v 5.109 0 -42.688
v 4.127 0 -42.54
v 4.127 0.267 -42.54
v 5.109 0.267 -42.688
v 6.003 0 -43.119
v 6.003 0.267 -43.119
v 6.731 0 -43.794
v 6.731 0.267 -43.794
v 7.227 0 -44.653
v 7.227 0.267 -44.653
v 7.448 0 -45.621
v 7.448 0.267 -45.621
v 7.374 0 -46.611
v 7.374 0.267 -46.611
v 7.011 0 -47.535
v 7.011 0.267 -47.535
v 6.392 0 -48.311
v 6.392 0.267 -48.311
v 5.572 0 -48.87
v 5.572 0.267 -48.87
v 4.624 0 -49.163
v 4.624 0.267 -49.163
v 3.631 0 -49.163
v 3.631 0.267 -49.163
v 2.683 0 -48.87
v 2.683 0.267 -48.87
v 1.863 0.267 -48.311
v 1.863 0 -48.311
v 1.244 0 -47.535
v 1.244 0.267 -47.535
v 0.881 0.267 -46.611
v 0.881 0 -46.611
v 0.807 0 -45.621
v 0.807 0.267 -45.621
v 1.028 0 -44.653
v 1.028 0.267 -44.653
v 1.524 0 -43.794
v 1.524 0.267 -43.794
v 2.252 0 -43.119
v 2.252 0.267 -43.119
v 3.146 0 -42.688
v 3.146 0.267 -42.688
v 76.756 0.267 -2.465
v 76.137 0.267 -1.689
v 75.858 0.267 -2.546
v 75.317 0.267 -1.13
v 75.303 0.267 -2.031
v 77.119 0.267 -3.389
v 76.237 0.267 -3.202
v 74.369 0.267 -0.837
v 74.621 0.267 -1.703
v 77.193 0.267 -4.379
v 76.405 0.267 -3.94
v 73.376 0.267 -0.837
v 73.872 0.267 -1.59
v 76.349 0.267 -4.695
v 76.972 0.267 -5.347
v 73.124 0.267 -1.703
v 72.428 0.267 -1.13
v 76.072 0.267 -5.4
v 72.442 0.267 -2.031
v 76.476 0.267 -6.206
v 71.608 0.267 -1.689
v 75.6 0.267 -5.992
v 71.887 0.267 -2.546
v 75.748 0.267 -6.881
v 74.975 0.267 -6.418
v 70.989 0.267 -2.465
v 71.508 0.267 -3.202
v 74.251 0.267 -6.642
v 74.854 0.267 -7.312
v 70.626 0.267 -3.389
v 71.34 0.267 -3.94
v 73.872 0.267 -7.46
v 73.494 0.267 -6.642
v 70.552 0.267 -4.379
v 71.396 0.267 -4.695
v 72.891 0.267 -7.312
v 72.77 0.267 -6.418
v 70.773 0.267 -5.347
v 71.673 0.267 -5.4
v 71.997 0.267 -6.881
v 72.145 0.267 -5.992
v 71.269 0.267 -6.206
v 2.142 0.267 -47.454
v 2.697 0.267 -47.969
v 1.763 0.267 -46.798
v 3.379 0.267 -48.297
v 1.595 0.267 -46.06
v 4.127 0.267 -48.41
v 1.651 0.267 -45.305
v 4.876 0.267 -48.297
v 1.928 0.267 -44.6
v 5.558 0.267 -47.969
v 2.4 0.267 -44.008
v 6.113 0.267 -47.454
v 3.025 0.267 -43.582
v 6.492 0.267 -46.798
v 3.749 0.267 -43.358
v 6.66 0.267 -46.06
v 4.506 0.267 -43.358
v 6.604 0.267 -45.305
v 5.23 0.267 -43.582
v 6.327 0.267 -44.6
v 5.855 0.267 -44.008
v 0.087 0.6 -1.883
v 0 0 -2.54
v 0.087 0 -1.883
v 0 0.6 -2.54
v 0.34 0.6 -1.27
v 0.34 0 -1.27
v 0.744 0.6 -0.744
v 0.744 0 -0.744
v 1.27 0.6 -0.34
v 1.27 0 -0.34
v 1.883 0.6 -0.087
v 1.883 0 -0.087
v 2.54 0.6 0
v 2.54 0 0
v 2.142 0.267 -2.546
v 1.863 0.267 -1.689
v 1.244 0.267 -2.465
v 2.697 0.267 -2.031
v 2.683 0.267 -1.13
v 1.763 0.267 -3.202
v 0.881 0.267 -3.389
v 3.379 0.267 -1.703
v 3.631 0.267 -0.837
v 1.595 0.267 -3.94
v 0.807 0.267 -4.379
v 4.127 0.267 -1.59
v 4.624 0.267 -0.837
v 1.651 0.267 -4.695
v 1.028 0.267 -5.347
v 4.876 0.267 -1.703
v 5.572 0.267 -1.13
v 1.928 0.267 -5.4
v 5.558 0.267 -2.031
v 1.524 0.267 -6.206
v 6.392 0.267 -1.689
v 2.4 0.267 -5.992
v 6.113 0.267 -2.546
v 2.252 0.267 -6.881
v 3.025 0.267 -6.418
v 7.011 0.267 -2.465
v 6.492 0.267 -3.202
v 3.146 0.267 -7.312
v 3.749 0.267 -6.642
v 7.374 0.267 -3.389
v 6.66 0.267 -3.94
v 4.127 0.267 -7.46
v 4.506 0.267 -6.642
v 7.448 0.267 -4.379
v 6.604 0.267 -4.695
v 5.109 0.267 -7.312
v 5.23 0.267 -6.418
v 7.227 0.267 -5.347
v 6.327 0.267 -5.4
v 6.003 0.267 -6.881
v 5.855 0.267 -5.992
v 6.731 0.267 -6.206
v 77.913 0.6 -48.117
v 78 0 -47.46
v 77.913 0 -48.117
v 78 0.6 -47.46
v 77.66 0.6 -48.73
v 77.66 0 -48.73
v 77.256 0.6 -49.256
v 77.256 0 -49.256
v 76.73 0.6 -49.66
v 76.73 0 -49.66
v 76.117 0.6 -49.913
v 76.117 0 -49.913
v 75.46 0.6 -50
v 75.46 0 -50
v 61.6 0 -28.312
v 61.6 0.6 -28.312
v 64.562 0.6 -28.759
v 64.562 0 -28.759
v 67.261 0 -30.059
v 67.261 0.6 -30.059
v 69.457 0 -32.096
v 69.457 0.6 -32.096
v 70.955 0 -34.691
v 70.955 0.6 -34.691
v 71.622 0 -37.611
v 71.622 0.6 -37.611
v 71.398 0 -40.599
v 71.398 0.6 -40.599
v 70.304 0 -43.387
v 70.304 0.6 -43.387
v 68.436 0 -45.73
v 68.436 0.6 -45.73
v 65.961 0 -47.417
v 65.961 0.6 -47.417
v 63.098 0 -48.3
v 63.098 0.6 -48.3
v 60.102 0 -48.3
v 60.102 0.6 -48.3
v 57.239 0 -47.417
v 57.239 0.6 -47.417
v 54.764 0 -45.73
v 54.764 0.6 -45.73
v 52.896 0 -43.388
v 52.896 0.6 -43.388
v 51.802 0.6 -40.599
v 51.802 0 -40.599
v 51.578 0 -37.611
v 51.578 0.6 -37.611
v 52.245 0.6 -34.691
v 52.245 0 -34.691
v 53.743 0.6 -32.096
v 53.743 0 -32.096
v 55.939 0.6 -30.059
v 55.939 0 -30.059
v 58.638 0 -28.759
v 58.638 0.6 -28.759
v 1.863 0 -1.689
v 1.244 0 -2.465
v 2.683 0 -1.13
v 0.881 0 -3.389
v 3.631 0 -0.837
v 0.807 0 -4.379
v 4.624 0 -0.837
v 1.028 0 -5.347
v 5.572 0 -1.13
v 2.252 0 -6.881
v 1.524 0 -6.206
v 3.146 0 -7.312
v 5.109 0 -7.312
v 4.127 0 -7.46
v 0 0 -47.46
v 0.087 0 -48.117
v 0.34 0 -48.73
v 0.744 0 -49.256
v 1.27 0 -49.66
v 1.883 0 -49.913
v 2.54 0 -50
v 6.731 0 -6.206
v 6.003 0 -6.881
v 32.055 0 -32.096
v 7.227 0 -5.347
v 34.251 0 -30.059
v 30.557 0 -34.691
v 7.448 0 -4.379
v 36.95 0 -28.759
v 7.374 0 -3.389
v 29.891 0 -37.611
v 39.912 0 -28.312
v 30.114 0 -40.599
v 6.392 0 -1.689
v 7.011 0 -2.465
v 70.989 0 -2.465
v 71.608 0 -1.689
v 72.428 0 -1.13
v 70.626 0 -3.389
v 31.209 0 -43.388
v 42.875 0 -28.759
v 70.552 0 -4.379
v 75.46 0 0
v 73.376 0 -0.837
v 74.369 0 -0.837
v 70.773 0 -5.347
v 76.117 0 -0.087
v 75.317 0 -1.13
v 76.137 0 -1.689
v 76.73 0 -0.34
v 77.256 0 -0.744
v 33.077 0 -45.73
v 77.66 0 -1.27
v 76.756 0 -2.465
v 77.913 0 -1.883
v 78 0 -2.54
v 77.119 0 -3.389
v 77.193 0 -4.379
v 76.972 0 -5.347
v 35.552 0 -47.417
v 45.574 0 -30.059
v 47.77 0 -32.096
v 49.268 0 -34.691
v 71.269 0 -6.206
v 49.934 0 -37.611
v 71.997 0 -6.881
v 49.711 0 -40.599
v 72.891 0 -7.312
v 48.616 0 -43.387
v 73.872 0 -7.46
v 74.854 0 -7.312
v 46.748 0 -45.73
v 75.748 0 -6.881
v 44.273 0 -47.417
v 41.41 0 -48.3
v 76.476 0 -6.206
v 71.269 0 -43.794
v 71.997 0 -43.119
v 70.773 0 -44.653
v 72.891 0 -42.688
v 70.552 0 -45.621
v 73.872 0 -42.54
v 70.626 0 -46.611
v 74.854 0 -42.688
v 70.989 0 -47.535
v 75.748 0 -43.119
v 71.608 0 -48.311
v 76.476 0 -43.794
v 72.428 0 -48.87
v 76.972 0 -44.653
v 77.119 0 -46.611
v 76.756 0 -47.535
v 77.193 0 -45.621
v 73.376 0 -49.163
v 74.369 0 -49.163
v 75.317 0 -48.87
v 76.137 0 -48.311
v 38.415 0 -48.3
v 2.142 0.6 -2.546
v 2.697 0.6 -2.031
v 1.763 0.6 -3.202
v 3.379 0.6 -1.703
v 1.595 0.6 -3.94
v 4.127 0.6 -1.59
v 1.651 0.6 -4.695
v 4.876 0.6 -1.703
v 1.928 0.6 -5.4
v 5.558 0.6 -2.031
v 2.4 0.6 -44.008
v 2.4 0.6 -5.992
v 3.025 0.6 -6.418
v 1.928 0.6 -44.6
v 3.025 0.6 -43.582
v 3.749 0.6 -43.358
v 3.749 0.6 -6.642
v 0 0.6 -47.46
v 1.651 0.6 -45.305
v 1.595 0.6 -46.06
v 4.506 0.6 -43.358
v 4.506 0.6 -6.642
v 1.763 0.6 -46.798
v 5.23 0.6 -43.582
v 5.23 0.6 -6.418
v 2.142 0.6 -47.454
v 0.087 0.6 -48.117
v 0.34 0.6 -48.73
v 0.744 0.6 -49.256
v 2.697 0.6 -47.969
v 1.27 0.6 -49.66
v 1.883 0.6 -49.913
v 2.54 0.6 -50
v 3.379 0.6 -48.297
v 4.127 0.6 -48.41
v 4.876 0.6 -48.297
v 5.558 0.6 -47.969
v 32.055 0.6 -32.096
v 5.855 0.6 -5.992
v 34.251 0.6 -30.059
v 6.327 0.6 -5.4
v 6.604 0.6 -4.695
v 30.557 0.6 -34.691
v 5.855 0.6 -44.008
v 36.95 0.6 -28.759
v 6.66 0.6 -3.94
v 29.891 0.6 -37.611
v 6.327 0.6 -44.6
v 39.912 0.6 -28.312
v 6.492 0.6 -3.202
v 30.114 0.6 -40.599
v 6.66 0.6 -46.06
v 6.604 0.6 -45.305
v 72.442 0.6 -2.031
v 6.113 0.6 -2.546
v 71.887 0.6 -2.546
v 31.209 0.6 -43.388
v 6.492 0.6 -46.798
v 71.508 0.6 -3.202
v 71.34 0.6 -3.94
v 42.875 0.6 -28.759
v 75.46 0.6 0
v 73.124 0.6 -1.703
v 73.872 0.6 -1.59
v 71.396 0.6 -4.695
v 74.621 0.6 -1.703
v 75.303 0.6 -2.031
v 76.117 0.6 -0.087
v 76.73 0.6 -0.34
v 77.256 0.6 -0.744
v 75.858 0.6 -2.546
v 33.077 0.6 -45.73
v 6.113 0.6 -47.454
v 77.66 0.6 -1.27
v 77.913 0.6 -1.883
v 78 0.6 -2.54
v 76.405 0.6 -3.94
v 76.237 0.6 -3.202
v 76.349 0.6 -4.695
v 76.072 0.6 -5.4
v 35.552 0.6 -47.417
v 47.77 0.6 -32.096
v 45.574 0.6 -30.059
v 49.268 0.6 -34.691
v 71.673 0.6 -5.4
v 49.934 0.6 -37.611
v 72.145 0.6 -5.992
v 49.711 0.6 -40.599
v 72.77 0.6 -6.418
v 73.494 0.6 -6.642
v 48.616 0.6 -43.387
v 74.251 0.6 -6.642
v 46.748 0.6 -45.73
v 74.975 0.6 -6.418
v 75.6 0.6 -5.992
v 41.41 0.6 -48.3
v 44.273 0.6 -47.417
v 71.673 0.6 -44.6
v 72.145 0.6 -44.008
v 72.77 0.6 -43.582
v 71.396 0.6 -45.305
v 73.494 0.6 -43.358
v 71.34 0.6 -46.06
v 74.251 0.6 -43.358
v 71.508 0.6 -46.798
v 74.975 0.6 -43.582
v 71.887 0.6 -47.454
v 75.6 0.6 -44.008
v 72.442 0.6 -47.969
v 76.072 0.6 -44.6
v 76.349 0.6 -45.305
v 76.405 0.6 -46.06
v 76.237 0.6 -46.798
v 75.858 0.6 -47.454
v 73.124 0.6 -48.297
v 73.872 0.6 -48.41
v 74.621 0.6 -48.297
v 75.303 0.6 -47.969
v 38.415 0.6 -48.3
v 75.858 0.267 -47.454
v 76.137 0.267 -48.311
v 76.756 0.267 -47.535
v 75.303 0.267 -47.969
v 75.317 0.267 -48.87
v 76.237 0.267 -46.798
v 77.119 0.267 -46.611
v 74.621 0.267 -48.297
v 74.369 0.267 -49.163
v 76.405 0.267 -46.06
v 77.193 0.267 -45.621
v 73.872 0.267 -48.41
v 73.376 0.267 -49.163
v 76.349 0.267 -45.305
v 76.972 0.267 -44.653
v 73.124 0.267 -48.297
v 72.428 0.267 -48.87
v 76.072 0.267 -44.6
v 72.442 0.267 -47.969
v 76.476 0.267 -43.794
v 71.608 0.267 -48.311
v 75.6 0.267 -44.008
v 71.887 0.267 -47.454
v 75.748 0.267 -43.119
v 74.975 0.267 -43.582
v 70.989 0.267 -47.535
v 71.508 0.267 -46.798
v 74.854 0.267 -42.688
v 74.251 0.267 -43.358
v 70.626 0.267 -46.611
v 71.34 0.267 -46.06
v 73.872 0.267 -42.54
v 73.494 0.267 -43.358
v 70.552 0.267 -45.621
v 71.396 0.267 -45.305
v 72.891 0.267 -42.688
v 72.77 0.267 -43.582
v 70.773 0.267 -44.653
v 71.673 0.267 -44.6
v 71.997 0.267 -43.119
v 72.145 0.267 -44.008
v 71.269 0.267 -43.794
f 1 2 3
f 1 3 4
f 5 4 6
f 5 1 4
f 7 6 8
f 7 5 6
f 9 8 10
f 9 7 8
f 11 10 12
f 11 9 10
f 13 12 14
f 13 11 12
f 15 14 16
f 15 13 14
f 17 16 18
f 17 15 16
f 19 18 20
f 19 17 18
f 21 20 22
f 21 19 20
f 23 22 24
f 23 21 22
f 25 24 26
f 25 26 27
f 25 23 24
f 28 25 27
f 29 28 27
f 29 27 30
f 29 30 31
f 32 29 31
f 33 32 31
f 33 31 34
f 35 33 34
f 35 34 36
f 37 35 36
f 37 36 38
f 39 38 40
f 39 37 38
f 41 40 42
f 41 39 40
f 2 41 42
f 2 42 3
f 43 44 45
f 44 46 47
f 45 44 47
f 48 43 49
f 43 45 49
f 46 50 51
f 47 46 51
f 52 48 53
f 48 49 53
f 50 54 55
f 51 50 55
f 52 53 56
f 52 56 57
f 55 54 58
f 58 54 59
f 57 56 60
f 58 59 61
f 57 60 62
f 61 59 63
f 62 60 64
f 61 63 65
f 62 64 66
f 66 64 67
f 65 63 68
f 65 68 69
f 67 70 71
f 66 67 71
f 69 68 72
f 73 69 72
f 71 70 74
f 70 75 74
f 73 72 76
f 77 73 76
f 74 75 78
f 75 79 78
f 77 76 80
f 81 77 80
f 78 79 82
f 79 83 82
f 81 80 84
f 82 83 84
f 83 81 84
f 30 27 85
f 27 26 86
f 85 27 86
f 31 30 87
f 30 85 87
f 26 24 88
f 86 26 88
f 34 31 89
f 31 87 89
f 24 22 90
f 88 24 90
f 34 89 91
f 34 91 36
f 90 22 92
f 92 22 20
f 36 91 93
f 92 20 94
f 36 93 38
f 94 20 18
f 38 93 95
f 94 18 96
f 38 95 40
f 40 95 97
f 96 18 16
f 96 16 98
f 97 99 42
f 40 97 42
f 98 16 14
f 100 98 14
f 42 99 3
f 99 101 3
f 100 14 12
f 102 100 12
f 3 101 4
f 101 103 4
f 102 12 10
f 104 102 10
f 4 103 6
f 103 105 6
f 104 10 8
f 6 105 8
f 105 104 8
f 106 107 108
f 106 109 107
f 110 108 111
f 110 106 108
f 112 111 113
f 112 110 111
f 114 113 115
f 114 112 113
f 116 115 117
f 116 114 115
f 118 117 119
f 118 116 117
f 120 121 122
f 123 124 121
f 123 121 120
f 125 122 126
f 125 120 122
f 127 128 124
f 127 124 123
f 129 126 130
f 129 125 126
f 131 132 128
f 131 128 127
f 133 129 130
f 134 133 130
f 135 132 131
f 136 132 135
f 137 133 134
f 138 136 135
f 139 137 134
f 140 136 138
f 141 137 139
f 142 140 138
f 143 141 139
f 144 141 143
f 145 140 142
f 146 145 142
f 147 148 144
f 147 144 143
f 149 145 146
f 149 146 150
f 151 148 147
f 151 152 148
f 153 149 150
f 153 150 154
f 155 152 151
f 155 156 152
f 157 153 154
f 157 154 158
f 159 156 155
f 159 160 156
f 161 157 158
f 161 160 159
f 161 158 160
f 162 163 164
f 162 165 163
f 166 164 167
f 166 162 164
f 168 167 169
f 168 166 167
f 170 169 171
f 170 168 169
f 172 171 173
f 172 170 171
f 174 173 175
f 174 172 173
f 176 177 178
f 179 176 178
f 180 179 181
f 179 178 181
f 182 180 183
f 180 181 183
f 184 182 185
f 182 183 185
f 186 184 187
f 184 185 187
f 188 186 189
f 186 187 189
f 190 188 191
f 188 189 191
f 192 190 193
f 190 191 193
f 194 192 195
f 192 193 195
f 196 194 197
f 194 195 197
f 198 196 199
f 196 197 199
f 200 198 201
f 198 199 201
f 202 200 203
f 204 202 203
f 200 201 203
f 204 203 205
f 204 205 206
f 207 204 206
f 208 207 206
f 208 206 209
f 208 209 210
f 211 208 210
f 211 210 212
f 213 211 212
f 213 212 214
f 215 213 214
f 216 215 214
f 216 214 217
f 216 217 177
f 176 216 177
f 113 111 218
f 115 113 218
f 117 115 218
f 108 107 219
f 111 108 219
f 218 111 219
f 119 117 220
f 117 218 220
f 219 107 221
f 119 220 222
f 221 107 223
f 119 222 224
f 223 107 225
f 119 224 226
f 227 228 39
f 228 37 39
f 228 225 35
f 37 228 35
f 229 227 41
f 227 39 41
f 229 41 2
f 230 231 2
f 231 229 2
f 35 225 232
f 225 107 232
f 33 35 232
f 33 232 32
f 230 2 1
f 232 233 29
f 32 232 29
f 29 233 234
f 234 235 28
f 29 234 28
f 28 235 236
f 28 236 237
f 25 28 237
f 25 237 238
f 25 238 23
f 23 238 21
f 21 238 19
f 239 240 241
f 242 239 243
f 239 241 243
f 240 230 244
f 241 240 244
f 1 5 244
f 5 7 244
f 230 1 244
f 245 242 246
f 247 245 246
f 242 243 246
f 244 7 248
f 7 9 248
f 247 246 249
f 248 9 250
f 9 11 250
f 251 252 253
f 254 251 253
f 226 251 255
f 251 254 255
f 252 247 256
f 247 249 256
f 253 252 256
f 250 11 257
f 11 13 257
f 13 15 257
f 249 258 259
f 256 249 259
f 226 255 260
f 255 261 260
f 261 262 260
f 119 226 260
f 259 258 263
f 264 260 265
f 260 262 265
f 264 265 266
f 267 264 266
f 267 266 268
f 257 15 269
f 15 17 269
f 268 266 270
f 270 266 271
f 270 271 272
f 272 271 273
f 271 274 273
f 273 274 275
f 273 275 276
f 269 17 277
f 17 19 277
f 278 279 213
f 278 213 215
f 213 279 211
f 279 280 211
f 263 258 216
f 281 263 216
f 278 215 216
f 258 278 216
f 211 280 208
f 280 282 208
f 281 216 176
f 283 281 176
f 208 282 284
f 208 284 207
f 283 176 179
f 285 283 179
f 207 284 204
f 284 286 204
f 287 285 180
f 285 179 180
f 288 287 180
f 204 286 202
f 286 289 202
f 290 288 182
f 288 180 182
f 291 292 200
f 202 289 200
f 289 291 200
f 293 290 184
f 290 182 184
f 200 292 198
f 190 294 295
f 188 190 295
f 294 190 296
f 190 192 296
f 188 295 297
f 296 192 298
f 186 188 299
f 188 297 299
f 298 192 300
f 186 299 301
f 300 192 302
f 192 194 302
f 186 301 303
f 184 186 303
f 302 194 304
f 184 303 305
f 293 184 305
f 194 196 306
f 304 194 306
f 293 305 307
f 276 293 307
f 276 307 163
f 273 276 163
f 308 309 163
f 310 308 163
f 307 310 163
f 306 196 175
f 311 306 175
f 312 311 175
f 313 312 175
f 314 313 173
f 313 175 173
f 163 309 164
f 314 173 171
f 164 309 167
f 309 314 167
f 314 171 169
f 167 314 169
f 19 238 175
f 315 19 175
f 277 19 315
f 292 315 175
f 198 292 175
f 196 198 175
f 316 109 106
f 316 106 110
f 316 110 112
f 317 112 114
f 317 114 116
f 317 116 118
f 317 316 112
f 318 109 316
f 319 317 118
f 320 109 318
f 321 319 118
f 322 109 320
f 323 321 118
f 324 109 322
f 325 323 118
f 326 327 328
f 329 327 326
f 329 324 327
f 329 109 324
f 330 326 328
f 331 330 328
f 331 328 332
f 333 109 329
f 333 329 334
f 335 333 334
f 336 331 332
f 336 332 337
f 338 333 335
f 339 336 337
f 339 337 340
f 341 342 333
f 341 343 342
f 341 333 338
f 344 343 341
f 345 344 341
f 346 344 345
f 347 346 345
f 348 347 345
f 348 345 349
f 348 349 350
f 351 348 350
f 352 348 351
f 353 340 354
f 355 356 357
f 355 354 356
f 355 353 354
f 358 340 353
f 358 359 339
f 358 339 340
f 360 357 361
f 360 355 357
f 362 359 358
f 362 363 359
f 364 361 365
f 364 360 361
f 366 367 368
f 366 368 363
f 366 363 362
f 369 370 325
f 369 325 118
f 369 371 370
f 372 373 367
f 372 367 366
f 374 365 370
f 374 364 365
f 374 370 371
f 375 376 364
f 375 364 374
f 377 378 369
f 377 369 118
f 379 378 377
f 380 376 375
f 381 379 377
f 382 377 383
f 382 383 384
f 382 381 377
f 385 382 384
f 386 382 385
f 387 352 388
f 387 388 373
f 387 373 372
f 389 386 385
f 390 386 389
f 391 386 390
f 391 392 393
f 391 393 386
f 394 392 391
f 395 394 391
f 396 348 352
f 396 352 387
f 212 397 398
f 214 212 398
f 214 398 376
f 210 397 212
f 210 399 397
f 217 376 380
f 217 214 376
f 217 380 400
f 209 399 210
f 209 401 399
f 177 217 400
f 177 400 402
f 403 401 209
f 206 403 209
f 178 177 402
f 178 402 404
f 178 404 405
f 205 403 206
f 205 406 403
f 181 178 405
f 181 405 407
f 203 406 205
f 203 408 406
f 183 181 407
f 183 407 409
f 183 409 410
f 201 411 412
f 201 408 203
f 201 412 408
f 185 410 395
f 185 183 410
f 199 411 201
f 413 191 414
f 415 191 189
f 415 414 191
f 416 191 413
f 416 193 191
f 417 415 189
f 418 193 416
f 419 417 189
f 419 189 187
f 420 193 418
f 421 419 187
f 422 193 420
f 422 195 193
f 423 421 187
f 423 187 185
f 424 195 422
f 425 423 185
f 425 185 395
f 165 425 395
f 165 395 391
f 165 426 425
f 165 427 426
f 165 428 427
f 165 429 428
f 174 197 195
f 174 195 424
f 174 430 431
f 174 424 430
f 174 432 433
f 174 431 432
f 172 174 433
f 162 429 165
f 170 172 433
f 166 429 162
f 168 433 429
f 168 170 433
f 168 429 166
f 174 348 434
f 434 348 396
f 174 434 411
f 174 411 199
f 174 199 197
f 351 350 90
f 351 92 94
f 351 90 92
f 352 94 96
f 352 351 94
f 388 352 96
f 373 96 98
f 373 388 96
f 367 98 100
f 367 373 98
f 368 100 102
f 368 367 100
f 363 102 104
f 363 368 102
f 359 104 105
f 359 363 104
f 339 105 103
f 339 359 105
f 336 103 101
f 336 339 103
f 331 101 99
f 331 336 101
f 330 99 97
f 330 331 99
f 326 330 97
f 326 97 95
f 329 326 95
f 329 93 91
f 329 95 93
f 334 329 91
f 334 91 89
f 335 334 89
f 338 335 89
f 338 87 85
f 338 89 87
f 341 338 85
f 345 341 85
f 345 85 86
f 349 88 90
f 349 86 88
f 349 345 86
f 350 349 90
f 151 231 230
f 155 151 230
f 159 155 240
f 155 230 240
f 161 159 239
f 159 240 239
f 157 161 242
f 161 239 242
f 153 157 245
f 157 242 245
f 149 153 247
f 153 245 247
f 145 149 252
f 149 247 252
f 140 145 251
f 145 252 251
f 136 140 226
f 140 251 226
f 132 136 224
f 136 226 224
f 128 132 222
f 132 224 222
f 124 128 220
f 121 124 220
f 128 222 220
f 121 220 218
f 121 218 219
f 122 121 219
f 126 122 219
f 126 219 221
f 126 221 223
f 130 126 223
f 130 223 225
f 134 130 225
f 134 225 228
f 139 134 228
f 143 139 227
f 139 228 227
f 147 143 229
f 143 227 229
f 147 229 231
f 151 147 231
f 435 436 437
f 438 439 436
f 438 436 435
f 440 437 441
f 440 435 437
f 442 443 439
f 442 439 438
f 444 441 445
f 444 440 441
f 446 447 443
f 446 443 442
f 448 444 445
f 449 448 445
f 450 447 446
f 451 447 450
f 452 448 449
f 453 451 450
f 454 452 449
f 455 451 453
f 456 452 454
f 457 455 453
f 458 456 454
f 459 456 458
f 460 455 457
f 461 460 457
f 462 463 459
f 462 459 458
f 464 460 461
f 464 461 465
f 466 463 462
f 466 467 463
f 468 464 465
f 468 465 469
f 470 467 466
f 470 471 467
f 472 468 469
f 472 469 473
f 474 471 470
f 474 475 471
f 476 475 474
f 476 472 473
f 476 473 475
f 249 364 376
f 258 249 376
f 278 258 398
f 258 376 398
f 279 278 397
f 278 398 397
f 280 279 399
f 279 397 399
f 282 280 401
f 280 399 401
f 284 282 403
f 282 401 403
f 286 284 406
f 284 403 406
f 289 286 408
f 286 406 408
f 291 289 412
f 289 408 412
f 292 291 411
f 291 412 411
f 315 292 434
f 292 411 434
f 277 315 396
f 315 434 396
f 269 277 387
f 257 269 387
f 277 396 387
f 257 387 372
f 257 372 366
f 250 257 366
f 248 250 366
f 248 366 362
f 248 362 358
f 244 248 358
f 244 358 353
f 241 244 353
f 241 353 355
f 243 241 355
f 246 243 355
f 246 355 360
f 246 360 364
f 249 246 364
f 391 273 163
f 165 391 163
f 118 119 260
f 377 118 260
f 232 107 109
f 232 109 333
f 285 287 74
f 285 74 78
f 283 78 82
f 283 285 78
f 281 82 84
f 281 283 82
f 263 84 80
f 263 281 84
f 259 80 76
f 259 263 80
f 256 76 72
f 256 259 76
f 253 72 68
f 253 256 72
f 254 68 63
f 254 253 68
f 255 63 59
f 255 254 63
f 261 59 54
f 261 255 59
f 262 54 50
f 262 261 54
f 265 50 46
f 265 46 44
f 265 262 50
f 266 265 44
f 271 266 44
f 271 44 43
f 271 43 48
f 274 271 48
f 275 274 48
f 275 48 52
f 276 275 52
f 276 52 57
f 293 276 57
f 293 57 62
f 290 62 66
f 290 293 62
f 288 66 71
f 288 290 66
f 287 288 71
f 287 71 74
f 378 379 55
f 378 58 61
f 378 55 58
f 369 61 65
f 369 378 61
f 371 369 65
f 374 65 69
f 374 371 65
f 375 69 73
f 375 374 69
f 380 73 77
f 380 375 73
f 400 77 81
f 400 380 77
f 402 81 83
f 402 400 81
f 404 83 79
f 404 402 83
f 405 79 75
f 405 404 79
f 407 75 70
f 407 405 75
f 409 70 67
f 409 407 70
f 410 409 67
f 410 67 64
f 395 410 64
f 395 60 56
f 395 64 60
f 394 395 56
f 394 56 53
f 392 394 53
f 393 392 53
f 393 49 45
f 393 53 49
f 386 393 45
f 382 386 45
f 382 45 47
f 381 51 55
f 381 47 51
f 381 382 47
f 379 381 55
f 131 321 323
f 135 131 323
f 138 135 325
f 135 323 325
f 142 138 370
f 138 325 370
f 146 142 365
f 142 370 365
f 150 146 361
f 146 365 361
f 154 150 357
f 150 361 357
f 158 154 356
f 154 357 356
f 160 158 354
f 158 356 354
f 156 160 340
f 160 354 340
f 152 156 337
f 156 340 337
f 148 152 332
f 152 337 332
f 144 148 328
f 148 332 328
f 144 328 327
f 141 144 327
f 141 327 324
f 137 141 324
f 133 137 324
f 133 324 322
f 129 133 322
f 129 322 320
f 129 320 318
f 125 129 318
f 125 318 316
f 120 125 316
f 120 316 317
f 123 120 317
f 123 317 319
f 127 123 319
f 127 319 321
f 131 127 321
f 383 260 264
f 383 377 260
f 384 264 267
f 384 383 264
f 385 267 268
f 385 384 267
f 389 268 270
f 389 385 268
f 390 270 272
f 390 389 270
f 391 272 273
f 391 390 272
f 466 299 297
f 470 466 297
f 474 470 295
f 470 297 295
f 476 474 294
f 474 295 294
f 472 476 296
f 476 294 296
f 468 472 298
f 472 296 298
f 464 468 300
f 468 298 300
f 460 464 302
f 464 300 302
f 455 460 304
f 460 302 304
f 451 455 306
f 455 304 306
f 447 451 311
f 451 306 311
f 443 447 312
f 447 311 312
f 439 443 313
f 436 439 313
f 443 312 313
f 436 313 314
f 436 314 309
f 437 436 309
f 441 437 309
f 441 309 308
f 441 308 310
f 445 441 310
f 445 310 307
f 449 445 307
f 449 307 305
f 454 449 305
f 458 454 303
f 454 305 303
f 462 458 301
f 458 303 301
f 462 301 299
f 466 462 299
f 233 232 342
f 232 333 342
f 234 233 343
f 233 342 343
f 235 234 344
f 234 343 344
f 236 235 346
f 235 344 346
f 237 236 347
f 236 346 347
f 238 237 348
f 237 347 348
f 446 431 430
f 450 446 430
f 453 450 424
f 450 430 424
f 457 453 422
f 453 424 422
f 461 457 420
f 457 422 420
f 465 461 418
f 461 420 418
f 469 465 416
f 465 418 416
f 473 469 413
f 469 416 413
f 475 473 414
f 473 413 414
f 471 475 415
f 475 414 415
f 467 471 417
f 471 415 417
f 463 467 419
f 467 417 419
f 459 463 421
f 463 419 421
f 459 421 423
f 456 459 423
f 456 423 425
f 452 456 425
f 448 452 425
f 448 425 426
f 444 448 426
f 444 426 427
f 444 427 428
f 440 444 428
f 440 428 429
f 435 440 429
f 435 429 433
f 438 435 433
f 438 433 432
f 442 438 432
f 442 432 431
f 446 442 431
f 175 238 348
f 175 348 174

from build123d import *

# Parameters (mm, degrees)
SKETCH1_W               = 78
SKETCH1_H               = 50
PCB_DEPTH               = 0.6
CARD_EDGES_R            = 2.54
SKETCH4_R               = 2.54
MAGNET_HOLE_CUT_DEPTH   = 93.651821353
SKETCH8_R               = 3.33
STEEL_INLAY_CUT_DEPTH   = 0.266625
MIRROR2_COPY_1_SKETCH_R = 2.54
MIRROR2_COPY_1_DEPTH    = 93.651821353
MIRROR2_COPY_2_SKETCH_R = 3.33
MIRROR2_COPY_2_DEPTH    = 0.266625
SKETCH15_R              = 10.05
BATTERY_HOLES_DEPTH     = 93.651821353


with BuildPart() as part:
    # Sketch1 → pcb (new body)
    with BuildSketch(Plane(origin=(0, 0, 0), x_dir=(1, 0, 0), z_dir=(0, 1, 0))):
        with Locations((39, 25)):
            Rectangle(SKETCH1_W, SKETCH1_H)
    extrude(amount=PCB_DEPTH)

    # card edges
    card_edges_edges = [part.edges().sort_by_distance(p)[0] for p in [
        (0, 0.3, -50),
        (78, 0.3, -50),
        (78, 0.3, 0),
        (0, 0.3, 0),
    ]]
    fillet(card_edges_edges, radius=CARD_EDGES_R)

    # Sketch4 → magnet hole cut (cut, through all)
    with BuildSketch(Plane(origin=(0, 0.6, 0), x_dir=(1, 0, 0), z_dir=(0, 1, 0))):
        with Locations(Location((4.1275, 4.13, 0), (0, 0, 270))):
            Circle(SKETCH4_R)
    magnet_hole_cut = extrude(amount=-MAGNET_HOLE_CUT_DEPTH, mode=Mode.SUBTRACT)

    # Sketch8 → steel inlay cut (cut)
    with BuildSketch(Plane.XZ):
        with Locations(Location((4.1275, -4.13, 0), (0, 0, 270))):
            Circle(SKETCH8_R)
    steel_inlay_cut = extrude(amount=-STEEL_INLAY_CUT_DEPTH, mode=Mode.SUBTRACT)

    # Mirror1: magnet hole cut, steel inlay cut across plane
    add(magnet_hole_cut.mirror(Plane.XY.offset(-25)), mode=Mode.SUBTRACT)
    add(steel_inlay_cut.mirror(Plane.XY.offset(-25)), mode=Mode.SUBTRACT)

    # Mirror2: magnet hole cut, steel inlay cut across plane
    add(magnet_hole_cut.mirror(Plane(origin=(39, 0, 0), x_dir=(0, 0, 1), z_dir=(1, 0, 0))), mode=Mode.SUBTRACT)
    add(steel_inlay_cut.mirror(Plane(origin=(39, 0, 0), x_dir=(0, 0, 1), z_dir=(1, 0, 0))), mode=Mode.SUBTRACT)

    # Mirror2 copy 1 sketch → Mirror2 copy 1 (cut, through all)
    with BuildSketch(Plane(origin=(78, 0.6, -50), x_dir=(-1, 0, 0), z_dir=(0, 1, 0))):
        with Locations(Location((4.1275, 4.13, 0), (0, 0, 270))):
            Circle(MIRROR2_COPY_1_SKETCH_R)
    extrude(amount=-MIRROR2_COPY_1_DEPTH, mode=Mode.SUBTRACT)

    # Mirror2 copy 2 sketch → Mirror2 copy 2 (cut)
    with BuildSketch(Plane(origin=(78, 0, -50), x_dir=(-1, 0, 0), z_dir=(0, -1, 0))):
        with Locations(Location((4.1275, -4.13, 0), (0, 0, 270))):
            Circle(MIRROR2_COPY_2_SKETCH_R)
    extrude(amount=-MIRROR2_COPY_2_DEPTH, mode=Mode.SUBTRACT)

    # Sketch15 → battery_holes (cut, through all)
    with BuildSketch(Plane(origin=(0, 0.6, 0), x_dir=(1, 0, 0), z_dir=(0, 1, 0))):
        with Locations(Location((61.6, 38.3625, 0), (0, 0, 270))):
            Circle(SKETCH15_R)
        with Locations(Location((39.9125, 38.3625, 0), (0, 0, 270))):
            Circle(SKETCH15_R)
    extrude(amount=-BATTERY_HOLES_DEPTH, mode=Mode.SUBTRACT)


solid = part.part
